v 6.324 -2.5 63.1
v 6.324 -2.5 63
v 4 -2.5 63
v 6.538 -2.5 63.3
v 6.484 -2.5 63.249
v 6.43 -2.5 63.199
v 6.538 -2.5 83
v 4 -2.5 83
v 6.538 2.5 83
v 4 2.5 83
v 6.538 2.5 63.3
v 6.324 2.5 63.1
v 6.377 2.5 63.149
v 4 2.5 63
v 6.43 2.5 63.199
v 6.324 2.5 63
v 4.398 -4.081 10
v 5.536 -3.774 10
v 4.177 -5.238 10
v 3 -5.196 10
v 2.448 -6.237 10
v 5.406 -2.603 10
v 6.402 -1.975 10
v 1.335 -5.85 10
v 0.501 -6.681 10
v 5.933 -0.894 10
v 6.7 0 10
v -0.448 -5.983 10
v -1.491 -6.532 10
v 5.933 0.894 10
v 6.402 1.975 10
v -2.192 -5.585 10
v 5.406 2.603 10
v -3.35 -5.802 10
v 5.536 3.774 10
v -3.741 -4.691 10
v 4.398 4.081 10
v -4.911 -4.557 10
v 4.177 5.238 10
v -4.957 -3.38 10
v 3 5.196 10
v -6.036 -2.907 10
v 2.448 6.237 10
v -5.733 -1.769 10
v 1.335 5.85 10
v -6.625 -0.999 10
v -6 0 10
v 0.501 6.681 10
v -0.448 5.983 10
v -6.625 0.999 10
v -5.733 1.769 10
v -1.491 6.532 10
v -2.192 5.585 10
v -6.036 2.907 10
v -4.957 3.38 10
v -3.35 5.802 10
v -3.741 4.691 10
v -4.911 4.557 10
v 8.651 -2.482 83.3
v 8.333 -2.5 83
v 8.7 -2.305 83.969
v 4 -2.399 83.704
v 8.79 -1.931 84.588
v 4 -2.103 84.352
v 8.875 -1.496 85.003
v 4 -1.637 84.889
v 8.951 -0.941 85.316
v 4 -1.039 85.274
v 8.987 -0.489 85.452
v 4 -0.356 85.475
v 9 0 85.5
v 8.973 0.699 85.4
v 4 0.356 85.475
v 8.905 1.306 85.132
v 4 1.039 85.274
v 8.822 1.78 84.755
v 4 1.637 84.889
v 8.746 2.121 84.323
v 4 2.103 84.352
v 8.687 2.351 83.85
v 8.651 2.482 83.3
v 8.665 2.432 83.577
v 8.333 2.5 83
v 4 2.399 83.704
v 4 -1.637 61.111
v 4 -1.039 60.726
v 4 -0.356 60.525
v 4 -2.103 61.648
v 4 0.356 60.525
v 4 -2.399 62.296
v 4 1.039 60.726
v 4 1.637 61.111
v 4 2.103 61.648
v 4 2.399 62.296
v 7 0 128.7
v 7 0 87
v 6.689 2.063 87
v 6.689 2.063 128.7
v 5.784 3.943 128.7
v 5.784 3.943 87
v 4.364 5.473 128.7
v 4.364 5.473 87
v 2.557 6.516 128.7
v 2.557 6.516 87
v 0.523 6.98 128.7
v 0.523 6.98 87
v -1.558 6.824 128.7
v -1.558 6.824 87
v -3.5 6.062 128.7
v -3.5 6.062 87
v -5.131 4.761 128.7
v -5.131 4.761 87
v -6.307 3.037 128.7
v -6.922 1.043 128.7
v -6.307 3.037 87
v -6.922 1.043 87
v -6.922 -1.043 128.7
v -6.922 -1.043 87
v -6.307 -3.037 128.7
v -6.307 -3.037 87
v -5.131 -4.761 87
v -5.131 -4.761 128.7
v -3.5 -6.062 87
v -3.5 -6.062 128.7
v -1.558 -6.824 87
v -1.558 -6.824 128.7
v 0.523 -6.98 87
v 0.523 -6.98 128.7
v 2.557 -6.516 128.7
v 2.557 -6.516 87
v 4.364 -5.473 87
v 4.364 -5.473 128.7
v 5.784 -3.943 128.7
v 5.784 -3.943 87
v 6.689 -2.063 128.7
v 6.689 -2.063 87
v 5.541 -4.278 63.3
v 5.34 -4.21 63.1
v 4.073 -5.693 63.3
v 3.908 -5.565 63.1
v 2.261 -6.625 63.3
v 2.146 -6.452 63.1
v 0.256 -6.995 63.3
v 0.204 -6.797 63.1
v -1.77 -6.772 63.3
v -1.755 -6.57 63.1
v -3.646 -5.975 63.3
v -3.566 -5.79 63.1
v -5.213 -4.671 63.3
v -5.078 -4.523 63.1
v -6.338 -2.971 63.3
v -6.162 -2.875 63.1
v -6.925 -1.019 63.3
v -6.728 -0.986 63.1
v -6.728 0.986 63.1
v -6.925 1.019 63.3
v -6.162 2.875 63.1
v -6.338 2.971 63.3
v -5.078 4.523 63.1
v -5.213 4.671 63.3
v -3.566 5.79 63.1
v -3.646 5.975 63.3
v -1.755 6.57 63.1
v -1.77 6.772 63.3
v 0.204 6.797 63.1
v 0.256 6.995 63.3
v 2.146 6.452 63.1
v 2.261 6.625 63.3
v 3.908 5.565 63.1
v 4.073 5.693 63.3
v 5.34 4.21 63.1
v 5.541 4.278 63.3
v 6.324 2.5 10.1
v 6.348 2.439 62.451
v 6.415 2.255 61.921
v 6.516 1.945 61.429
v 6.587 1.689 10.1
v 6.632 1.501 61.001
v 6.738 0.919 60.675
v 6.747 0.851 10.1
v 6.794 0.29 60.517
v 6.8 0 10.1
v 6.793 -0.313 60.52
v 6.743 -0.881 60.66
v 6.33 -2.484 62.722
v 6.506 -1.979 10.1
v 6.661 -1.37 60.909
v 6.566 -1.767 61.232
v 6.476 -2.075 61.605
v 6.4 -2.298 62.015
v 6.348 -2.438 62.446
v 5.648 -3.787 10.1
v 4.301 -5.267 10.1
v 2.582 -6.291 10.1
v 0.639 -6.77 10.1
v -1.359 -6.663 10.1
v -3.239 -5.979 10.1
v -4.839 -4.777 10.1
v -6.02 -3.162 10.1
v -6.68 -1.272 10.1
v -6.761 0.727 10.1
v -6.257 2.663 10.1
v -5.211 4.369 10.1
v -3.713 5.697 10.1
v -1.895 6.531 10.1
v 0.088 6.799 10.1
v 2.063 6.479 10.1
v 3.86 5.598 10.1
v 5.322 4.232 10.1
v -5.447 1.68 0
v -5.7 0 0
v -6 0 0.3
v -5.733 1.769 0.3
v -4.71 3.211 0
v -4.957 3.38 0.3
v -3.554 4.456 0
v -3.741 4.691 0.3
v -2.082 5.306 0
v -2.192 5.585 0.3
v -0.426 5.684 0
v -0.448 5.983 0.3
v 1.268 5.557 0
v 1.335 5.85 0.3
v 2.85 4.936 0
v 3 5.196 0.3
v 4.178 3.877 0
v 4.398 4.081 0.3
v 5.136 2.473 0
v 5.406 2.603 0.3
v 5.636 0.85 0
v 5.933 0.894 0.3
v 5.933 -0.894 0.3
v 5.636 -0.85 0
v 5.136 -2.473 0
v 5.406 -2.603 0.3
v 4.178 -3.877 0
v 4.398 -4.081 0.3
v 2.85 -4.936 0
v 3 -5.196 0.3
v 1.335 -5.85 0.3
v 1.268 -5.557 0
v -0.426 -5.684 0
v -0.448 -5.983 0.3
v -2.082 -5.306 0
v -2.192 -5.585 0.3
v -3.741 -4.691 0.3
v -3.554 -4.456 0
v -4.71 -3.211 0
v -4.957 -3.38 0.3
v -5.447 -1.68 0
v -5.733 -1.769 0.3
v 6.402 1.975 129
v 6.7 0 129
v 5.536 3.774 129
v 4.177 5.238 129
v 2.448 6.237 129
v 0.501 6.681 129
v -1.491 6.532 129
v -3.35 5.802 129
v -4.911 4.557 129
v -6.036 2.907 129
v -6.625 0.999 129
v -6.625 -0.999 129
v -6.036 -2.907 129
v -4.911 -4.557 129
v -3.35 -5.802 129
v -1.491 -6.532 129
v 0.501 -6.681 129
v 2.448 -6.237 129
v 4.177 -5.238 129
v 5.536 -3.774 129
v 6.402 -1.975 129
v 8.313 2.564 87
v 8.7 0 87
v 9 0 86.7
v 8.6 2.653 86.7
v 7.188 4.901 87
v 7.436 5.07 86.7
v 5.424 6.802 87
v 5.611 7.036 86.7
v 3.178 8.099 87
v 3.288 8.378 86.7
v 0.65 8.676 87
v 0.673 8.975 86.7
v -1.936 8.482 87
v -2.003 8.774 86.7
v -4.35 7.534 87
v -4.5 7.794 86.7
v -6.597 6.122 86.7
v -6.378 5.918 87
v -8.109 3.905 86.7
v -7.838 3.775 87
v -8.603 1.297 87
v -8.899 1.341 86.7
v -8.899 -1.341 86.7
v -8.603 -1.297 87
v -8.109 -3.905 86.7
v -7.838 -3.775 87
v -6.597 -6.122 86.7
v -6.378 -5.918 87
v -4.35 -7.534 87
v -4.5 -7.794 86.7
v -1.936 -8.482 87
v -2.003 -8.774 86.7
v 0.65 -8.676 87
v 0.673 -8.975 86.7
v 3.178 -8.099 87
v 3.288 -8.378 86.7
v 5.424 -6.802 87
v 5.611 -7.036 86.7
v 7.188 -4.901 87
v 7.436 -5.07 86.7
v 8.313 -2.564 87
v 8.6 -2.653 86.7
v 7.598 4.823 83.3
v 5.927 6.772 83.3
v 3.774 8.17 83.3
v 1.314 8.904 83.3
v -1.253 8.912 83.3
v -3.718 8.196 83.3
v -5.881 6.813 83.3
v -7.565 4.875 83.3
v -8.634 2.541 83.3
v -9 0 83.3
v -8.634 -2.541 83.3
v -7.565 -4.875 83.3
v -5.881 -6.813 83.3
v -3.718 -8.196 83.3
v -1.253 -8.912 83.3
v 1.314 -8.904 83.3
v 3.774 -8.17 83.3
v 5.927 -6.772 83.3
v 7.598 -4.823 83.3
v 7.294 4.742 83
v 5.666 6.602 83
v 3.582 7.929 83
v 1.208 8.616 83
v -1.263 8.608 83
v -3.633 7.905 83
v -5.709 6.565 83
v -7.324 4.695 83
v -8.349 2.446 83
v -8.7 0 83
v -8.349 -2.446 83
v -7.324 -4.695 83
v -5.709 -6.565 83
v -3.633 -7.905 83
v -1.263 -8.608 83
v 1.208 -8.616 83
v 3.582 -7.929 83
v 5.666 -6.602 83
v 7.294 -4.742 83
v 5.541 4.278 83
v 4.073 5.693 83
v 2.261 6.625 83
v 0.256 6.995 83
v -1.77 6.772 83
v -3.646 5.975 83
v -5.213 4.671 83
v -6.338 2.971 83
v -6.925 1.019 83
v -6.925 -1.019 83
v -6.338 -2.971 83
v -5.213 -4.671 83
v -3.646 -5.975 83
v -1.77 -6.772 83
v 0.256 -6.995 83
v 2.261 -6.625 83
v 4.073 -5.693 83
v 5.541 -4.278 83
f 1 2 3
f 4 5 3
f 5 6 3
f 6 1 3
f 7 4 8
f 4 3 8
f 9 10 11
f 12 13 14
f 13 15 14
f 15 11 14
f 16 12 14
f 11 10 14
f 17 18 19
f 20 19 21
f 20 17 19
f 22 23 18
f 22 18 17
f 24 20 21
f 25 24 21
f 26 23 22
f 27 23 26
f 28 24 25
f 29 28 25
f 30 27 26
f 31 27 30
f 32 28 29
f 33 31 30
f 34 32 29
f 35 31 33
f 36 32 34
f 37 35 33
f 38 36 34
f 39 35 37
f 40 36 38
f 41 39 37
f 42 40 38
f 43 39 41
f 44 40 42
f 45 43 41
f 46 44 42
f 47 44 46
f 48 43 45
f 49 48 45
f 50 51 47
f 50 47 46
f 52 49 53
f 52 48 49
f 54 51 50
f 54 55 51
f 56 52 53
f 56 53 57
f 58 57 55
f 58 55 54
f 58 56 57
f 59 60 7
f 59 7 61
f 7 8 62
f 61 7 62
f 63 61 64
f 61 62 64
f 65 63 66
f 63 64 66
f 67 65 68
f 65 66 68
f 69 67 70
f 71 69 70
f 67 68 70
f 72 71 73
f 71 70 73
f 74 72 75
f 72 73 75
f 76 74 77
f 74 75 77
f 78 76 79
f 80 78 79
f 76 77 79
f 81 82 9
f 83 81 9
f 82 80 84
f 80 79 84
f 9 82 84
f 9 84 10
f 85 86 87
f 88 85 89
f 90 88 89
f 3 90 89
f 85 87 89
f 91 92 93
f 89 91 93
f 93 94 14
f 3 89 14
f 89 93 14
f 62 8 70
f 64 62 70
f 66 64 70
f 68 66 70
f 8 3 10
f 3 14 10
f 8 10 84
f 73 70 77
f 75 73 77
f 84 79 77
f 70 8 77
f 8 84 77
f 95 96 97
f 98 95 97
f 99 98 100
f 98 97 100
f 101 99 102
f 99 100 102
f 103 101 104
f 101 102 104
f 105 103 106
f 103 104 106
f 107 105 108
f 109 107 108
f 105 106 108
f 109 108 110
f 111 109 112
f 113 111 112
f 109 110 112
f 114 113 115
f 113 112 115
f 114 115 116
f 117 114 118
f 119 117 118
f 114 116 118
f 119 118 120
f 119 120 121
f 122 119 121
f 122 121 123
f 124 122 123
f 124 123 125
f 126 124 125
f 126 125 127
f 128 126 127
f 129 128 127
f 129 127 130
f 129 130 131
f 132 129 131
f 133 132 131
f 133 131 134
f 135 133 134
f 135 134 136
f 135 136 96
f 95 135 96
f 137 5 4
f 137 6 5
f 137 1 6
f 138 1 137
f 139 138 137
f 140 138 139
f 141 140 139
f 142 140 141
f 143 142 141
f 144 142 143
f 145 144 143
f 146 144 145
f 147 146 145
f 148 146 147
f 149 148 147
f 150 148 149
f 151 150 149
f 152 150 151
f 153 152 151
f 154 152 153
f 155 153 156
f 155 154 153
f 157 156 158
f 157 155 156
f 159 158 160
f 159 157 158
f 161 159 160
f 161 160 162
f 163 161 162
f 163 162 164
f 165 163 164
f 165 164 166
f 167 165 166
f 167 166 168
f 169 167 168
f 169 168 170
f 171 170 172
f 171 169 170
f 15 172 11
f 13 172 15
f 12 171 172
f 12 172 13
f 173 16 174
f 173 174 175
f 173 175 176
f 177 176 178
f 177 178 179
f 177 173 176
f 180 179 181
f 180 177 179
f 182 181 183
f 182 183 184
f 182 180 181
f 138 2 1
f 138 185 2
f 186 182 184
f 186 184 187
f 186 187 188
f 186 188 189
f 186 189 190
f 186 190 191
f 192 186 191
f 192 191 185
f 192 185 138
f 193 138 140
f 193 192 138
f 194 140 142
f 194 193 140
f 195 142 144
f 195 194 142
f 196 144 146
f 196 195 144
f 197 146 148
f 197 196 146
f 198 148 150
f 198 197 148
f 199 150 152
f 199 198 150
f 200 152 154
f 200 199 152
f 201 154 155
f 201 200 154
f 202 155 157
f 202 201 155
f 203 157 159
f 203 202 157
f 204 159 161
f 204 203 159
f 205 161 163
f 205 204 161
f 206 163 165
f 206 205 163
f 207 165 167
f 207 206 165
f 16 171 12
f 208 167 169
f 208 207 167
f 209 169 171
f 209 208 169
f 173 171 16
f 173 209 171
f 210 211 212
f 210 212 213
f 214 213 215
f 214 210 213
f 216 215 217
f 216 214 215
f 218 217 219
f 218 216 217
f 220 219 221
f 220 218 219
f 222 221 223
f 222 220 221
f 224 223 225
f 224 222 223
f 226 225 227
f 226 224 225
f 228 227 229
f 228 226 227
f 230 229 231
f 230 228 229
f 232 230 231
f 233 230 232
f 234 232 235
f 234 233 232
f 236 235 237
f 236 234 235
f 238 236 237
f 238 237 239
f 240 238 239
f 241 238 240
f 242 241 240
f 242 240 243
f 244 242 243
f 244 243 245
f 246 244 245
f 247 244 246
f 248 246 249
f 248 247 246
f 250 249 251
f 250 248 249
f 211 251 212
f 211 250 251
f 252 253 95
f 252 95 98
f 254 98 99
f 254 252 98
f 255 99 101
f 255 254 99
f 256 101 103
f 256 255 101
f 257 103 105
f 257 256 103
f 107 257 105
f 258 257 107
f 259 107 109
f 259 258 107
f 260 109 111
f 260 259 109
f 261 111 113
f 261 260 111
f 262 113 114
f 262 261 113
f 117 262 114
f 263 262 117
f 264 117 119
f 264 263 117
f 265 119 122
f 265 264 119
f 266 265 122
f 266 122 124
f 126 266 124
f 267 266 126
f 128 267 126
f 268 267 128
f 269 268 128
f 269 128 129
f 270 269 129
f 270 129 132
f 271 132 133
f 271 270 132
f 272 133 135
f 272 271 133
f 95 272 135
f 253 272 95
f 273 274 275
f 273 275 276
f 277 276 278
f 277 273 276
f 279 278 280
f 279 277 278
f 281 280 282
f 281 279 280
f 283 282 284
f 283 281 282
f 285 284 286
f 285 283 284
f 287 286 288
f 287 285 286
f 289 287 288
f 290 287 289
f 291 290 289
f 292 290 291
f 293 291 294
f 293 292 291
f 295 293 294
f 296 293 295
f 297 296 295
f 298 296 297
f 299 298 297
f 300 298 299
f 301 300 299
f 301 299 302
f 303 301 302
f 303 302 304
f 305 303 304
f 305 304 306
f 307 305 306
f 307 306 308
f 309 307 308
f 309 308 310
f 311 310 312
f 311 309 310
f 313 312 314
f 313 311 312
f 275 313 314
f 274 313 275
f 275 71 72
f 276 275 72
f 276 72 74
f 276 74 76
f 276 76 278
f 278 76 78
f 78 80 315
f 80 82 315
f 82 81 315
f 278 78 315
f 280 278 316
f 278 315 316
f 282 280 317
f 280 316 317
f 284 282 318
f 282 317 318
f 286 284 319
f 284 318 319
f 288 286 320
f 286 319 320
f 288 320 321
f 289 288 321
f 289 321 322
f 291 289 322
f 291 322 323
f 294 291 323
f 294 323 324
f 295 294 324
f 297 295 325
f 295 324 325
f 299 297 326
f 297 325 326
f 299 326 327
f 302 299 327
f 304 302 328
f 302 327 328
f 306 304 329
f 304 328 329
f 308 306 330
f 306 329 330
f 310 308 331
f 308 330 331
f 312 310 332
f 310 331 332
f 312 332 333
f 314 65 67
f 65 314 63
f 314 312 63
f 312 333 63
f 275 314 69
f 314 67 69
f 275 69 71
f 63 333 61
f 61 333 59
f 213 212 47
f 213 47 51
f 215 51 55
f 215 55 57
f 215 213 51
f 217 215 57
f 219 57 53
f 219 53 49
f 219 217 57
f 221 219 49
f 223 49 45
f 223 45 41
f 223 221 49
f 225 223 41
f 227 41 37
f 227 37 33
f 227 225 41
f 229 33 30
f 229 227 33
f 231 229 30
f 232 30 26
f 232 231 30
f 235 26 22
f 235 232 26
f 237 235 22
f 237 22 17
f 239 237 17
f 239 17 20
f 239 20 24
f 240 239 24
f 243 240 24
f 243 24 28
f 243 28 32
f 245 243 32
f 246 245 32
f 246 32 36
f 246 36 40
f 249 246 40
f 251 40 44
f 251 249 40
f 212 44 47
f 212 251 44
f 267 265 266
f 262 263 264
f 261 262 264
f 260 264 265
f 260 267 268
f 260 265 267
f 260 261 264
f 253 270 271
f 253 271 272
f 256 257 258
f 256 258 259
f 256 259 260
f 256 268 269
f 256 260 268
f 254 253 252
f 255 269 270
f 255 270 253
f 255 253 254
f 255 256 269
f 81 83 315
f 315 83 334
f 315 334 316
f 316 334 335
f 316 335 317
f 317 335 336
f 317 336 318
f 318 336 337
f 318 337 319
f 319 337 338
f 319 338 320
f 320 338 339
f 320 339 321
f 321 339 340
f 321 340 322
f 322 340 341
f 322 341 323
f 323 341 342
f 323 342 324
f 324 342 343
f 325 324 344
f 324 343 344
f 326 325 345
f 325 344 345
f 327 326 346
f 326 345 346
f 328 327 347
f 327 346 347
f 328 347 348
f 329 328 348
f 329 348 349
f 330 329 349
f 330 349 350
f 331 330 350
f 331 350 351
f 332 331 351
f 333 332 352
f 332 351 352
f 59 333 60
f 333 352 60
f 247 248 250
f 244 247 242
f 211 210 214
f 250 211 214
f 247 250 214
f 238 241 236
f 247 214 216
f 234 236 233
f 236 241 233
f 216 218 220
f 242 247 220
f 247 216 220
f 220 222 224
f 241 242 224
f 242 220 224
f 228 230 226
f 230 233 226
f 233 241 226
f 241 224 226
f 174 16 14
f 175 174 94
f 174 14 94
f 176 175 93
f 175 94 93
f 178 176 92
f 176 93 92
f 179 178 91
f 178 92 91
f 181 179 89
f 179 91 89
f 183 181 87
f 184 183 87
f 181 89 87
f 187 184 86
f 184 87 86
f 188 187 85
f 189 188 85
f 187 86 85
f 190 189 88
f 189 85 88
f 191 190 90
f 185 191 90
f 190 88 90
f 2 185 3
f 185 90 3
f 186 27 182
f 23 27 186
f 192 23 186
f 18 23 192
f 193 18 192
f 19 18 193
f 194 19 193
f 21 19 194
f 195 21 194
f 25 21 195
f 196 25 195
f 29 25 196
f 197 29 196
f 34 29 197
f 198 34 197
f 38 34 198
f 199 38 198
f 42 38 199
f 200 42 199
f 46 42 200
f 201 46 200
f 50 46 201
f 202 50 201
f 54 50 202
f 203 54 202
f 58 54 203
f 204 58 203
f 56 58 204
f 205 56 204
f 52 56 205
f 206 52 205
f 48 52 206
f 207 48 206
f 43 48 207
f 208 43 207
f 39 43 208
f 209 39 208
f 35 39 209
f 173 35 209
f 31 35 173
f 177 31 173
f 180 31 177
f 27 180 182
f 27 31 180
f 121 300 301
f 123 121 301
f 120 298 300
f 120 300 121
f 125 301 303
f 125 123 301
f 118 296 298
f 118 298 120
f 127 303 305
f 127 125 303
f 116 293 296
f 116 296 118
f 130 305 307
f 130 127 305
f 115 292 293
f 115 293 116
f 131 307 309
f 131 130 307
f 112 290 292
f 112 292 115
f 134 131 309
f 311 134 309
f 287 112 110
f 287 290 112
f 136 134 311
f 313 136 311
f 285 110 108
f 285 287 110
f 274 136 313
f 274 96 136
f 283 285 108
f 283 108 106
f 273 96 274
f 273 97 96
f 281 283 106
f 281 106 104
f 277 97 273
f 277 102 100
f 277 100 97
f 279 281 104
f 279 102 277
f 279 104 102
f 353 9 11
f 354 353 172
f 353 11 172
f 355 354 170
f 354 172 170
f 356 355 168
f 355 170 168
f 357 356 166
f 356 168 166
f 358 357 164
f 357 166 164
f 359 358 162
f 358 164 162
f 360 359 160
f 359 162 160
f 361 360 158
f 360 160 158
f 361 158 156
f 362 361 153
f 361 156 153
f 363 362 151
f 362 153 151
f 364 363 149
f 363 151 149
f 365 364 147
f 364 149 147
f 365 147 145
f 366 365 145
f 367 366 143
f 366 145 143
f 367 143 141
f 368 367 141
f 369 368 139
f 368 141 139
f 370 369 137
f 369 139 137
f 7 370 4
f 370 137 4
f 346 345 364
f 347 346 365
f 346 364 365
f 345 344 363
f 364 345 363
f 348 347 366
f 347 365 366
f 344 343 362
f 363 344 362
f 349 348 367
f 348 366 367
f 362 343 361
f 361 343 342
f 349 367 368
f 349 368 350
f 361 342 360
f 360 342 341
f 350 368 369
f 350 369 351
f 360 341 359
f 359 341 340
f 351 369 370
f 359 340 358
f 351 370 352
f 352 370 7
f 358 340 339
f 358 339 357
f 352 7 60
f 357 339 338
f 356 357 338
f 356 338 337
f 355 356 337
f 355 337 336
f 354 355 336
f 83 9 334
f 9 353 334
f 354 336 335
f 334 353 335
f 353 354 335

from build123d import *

# Parameters (mm, degrees)
SKETCH1_R         = 7
EXTRUDE1_DEPTH    = 129
EXTRUDE2_START    = -46
SKETCH2_R         = 9
EXTRUDE2_DEPTH    = 4
EXTRUDE3_START    = 4
EXTRUDE3_DEPTH    = 126.626386203
SKETCH4_OUTSIDE_W = 46.298
SKETCH4_OUTSIDE_H = 46.298
SKETCH4_OUTSIDE_R = 6
EXTRUDE4_DEPTH    = 10
CHAMFER1_SIZE     = 0.3
SKETCH5_OUTSIDE_W = 46.298
SKETCH5_OUTSIDE_H = 46.298
SKETCH5_OUTSIDE_R = 6.8
EXTRUDE5_DEPTH    = 63
CHAMFER2_SIZE     = 0.3


with BuildPart() as part:
    # Sketch1 → Extrude1 (new body)
    with BuildSketch(Plane.XY):
        Circle(SKETCH1_R)
    extrude(amount=EXTRUDE1_DEPTH)

    # Sketch2 → Extrude2 (add)
    with BuildSketch(Plane.XY.offset(129).offset(EXTRUDE2_START)):
        Circle(SKETCH2_R)
    extrude(amount=EXTRUDE2_DEPTH)

    # Sketch3 → Extrude3 (cut, through all)
    with BuildSketch(Plane(origin=(0, 0, 0), x_dir=(0, 0, -1), z_dir=(1, 0, 0)).offset(EXTRUDE3_START)):
        with BuildLine():
            Line((-83, 2.5), (-63, 2.5))
            ThreePointArc((-63, 2.5), (-60.5, 0), (-63, -2.5))
            Line((-63, -2.5), (-83, -2.5))
            ThreePointArc((-83, -2.5), (-85.5, 0), (-83, 2.5))
        make_face()
    extrude(amount=EXTRUDE3_DEPTH, mode=Mode.SUBTRACT)

    # Sketch4 outside → Extrude4 (cut)
    with BuildSketch(Plane(origin=(0, 0, 0), x_dir=(-1, 0, 0), z_dir=(0, 0, -1))):
        Rectangle(SKETCH4_OUTSIDE_W, SKETCH4_OUTSIDE_H)
        Circle(SKETCH4_OUTSIDE_R, mode=Mode.SUBTRACT)
    extrude(amount=-EXTRUDE4_DEPTH, mode=Mode.SUBTRACT)

    # Chamfer1
    chamfer1_edges = [part.edges().sort_by_distance(p)[0] for p in [
        (6, 0, 0),
        (-7, 0, 129),
        (-9, 0, 87),
        (-9, 0, 83),
        (-7, 0, 10),
    ]]
    chamfer(chamfer1_edges, length=CHAMFER1_SIZE)

    # Sketch5 outside → Extrude5 (cut)
    with BuildSketch(Plane(origin=(0, 0, 0), x_dir=(-1, 0, 0), z_dir=(0, 0, -1))):
        Rectangle(SKETCH5_OUTSIDE_W, SKETCH5_OUTSIDE_H)
        with Locations(Location((0, 0, 0), (0, 0, 158.429421698))):
            Circle(SKETCH5_OUTSIDE_R, mode=Mode.SUBTRACT)
    extrude(amount=-EXTRUDE5_DEPTH, mode=Mode.SUBTRACT)

    # Chamfer2
    # the kernel refuses this chamfer: 0.3 mm, written as the material it takes off along each edge
    with BuildSketch(Plane(origin=(0, 0, 63), x_dir=(0.9678051111401075, -0.25170074861049596, 0), z_dir=(0.25170074861049596, 0.9678051111401075, 0))) as chamfer2_piece_1_section:
        Polygon((7, -CHAMFER2_SIZE), (7 - CHAMFER2_SIZE, 0), (7, 0), align=None)
    chamfer2_piece_1 = revolve(axis=Axis((0, 0, 63), (0, 0, -1)), revolution_arc=330.843646851, mode=Mode.PRIVATE)
    chamfer2_piece_1 = chamfer2_piece_1 - Plane(origin=(0, 0, 63.195747315), x_dir=(0.9299653972776295, 0.36764705882987936, 0), z_dir=(0, 0, -1)) * Cylinder(6.8, 28, mode=Mode.PRIVATE)
    add(chamfer2_piece_1, mode=Mode.SUBTRACT)


solid = part.part
